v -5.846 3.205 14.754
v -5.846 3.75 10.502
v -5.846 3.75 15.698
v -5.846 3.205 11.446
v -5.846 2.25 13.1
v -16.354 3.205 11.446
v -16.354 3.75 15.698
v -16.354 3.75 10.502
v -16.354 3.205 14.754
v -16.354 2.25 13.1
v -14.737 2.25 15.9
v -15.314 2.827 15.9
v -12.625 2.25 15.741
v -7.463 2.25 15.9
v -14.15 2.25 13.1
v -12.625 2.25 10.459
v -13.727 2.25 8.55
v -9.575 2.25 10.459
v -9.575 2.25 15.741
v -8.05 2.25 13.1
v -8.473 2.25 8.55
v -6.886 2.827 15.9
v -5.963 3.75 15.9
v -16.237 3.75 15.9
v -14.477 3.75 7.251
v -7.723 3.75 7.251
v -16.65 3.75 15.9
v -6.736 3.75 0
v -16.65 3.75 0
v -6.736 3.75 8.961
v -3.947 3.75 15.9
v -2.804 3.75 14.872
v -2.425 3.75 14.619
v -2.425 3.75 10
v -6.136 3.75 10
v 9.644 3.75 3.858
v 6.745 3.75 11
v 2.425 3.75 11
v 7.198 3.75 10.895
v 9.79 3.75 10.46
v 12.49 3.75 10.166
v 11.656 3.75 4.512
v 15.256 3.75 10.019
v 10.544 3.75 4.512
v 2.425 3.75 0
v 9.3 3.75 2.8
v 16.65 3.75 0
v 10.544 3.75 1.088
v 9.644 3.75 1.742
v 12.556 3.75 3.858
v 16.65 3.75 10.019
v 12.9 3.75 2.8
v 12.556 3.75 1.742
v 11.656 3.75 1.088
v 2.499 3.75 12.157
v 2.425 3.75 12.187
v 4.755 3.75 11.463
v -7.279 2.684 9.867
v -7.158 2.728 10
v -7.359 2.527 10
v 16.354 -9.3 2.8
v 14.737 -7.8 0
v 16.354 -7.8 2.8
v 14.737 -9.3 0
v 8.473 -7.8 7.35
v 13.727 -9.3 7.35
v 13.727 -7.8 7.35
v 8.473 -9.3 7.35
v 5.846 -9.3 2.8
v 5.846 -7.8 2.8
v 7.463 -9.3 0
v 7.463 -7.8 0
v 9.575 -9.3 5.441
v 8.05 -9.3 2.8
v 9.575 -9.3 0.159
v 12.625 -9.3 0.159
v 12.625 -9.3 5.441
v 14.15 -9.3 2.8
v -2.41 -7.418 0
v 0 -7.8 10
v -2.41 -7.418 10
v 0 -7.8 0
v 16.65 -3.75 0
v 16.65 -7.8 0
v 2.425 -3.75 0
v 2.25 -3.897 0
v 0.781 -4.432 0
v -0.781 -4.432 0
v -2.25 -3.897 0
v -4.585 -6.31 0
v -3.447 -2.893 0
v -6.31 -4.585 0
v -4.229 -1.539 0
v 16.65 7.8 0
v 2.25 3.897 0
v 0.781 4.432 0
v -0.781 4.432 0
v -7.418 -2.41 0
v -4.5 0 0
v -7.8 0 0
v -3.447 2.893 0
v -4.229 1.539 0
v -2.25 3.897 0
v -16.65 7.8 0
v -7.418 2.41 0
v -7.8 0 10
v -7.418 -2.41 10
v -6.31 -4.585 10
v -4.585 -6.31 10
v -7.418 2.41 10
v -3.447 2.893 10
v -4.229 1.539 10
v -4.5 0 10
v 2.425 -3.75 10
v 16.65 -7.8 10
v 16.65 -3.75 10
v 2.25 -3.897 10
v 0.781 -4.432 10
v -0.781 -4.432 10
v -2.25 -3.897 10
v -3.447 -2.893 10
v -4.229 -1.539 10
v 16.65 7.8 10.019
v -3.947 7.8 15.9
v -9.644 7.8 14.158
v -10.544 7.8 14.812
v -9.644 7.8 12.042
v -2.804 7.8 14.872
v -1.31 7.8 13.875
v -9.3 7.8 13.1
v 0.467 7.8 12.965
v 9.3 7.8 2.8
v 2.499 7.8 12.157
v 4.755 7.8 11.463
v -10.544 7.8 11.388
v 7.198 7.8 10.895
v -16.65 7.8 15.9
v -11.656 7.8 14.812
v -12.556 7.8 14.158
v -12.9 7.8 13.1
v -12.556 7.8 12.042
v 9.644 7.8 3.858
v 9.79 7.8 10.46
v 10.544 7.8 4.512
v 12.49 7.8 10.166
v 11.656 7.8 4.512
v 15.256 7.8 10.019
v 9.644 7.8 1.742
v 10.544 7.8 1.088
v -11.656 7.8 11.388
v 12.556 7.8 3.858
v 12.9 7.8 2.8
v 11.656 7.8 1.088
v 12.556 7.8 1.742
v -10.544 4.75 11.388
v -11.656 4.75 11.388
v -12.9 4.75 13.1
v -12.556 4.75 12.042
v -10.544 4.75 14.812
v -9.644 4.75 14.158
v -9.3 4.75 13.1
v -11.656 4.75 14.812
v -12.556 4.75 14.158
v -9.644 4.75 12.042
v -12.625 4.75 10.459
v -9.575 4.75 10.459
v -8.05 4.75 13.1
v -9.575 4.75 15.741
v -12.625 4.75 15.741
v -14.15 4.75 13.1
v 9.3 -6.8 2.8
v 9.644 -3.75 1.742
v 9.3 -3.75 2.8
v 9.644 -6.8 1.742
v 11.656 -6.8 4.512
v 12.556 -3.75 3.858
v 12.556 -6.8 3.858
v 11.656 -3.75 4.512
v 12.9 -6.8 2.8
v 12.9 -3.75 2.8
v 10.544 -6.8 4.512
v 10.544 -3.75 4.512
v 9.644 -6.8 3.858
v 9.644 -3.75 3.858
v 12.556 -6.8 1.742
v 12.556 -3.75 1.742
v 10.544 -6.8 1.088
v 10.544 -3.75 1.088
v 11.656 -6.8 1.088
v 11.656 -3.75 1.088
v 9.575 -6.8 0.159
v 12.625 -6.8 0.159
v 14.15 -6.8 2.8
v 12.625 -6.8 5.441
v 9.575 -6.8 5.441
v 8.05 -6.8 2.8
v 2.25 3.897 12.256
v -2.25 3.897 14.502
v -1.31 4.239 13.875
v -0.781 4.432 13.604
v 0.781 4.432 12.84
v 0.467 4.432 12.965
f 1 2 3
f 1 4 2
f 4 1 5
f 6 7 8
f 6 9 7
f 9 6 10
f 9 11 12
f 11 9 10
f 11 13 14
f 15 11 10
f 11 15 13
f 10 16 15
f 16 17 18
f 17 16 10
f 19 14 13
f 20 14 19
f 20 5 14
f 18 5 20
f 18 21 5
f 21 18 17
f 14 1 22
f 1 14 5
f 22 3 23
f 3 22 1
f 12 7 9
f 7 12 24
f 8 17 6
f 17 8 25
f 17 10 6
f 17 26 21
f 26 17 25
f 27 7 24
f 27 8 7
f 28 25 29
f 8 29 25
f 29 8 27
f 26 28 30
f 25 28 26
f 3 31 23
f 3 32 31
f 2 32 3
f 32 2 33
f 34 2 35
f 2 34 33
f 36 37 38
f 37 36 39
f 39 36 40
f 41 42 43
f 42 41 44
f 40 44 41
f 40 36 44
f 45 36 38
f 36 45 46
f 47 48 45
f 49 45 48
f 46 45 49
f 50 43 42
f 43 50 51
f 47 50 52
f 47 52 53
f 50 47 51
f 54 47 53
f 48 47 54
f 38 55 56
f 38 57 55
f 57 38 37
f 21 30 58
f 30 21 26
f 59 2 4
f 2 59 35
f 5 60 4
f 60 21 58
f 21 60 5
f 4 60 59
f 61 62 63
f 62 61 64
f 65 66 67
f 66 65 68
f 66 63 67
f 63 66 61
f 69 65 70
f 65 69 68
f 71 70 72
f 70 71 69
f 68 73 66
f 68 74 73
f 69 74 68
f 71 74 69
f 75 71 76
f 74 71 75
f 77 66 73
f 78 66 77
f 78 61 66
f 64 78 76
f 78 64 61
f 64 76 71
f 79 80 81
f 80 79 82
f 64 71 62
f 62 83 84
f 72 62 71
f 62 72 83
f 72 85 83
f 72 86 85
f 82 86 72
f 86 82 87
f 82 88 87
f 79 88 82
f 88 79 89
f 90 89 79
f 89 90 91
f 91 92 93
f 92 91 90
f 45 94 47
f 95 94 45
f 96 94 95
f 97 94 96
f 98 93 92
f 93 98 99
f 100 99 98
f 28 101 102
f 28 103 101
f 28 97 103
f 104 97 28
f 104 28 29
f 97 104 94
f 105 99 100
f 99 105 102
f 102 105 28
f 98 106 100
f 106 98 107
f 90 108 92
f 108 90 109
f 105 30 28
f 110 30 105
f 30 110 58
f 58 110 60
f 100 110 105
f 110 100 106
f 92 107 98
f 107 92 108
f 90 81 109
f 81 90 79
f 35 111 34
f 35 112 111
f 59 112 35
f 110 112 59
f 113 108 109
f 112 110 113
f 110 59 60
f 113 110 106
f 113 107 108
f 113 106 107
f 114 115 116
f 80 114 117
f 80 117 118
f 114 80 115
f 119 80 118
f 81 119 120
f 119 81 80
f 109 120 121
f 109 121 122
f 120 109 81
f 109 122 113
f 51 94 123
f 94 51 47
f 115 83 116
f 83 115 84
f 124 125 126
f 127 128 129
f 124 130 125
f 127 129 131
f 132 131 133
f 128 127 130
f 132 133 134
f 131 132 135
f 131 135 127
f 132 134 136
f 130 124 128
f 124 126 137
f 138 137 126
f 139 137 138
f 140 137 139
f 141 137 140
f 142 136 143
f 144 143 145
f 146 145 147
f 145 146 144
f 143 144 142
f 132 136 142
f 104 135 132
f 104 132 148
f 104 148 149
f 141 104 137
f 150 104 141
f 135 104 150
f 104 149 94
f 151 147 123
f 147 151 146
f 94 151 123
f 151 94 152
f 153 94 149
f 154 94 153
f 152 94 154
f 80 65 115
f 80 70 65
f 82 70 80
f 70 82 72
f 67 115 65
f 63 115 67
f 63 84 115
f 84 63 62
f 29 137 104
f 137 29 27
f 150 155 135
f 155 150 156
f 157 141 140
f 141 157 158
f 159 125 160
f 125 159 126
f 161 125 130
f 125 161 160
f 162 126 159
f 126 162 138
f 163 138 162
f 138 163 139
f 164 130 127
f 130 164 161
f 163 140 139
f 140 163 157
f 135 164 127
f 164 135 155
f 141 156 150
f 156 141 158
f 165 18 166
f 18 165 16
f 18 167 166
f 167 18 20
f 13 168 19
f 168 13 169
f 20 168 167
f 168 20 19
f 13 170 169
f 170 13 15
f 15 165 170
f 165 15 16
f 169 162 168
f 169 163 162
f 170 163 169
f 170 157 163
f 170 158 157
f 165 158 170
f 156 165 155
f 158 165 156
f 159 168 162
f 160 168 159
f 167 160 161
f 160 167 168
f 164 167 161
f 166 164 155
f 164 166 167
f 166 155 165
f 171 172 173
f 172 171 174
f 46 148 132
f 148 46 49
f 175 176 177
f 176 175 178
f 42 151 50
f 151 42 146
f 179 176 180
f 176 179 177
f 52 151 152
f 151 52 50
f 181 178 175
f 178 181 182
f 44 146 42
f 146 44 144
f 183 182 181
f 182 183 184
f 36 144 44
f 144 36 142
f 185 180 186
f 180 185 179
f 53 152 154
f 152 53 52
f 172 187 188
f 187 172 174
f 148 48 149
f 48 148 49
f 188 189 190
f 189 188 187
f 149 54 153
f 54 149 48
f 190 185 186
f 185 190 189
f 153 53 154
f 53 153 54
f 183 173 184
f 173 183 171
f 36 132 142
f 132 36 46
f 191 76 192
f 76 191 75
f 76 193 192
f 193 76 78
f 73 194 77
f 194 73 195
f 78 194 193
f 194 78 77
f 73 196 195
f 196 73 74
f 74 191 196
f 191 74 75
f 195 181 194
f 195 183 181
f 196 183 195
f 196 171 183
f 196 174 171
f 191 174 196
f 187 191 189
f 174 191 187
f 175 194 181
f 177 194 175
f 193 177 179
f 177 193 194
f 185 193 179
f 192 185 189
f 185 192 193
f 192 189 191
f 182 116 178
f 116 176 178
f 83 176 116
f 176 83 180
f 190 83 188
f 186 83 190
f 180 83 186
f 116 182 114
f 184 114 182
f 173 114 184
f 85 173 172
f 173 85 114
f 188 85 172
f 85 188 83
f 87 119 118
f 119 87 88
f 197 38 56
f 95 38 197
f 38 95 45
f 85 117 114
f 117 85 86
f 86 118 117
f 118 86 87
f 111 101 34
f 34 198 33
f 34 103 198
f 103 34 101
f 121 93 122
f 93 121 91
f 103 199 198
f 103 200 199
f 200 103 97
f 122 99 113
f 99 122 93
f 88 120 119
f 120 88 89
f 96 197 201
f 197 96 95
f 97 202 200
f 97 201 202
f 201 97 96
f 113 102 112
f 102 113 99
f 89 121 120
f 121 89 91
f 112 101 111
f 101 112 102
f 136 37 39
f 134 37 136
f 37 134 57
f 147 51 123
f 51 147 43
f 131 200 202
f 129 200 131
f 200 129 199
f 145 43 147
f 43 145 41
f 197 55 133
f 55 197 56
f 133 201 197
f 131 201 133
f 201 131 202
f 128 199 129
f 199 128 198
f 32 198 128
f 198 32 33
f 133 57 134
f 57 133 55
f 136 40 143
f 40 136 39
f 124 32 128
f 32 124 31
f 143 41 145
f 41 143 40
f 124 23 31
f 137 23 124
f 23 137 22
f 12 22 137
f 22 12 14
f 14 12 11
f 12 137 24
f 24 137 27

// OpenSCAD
// file: functions.scad
// PRUSA Mendel  
// Functions used in many files
// GNU GPL v2
// Josef Průša
// josefprusa@me.com
// prusadjs.cz
// http://www.reprap.org/wiki/Prusa_Mendel
// http://github.com/prusajr/PrusaMendel

module nut(d,h,horizontal=true){
cornerdiameter =  (d / 2) / cos (180 / 6);
cylinder(h = h, r = cornerdiameter, $fn = 6);
if(horizontal){
for(i = [1:6]){
	rotate([0,0,60*i]) translate([-cornerdiameter-0.2,0,0]) rotate([0,0,-45]) cube(size = [2,2,h]);
}}
}

// By nophead
module polyhole(d,h) {
    n = max(round(2 * d),3);
    rotate([0,0,180])
        cylinder(h = h, r = (d / 2) / cos (180 / n), $fn = n);
}




module roundcorner(diameter){
	difference(){
		cube(size = [diameter,diameter,99], center = false);
		translate(v = [diameter, diameter, 0]) cylinder(h = 100, r=diameter, center=true);
	}
}
// file: metric.scad
// PRUSA Mendel  
// Default metric sizes
// GNU GPL v2
// Josef Průša
// josefprusa@me.com
// prusadjs.cz
// http://www.reprap.org/wiki/Prusa_Mendel
// http://github.com/prusajr/PrusaMendel

// DONT CHANGE THIS FILE! ALTER VALUES IN CONFIGURATION.SCAD INSTEAD

// RODS

threaded_rod_diameter = 8.2;
threaded_rod_diameter_horizontal = 8.2;
smooth_bar_diameter = 8;
smooth_bar_diameter_horizontal = 8.5;

// Nuts and bolts

m8_diameter = 9;
m8_nut_diameter = 16.4;

m4_diameter = 4.5;
m4_nut_diameter = 9;

m3_diameter = 3.6;
m3_nut_diameter = 6.1;
m3_nut_diameter_horizontal = 6.1;

// Bushing holder

bushing_core_diameter = smooth_bar_diameter;
bushing_material_thickness = 1;

// Motors

motor_shaft = 5.5;
// file: configuration.scad
// PRUSA Mendel  
// Configuration file
// GNU GPL v2
// Josef Průša
// josefprusa@me.com
// prusadjs.cz
// http://www.reprap.org/wiki/Prusa_Mendel
// http://github.com/prusajr/PrusaMendel

// PLEASE SELECT ONE OF THE CONFIGURATIONS BELOW
// BY UN-COMMENTING IT

// Uncomment for metric settings
// METRIC METRIC METRIC METRIC METRIC METRIC METRIC METRIC 

include <metric.scad>;

// Uncomment for imperial settings
// IMPERIAL IMPERIAL IMPERIAL IMPERIAL IMPERIAL IMPERIAL IMPERIAL 

//include <sae.scad>;

// CUSTOM CUSTOM CUSTOM CUSTOM CUSTOM CUSTOM CUSTOM CUSTOM CUSTOM

thin_wall = 3;

// LM8UU
linear = false;


// CHANGE ONLY THE STUFF YOU KNOW
// IT WILL REPLACE DEFAULT SETTING

// RODS

// threaded_rod_diameter = 0;
// threaded_rod_diameter_horizontal = 0;
// smooth_bar_díameter = 0;
// smooth_bar_díameter_horizontal = 0;

// Nuts and bolts

// m8_diameter = 0;
// m8_nut_diameter = 0;

// m4_diameter = 0;
// m4_nut_diameter = 0;

// m3_diameter = 0;
// m3_nut_diameter = 0;

// Bushing holder

// bushing_core_diameter = smooth_bar_díameter;
// bushing_material_thickness = 0;


///counted stuff
m3_nut_diameter_bigger = ((m3_nut_diameter  / 2) / cos (180 / 6))*2;

// functions 
include <functions.scad>
// main file
// PRUSA Mendel  
// Endstop holder
// Used to attach endstops to 8mm rods
// GNU GPL v2
// Josef Průša
// josefprusa@me.com
// prusadjs.cz
// http://www.reprap.org/wiki/Prusa_Mendel
// http://github.com/prusajr/PrusaMendel

include <configuration.scad>

/**
 * @name Endstop holder
 * @category Printed
 * @using 1 m3x20
 * @using 1 m3nut
 * @using 2 m3washer
 */
module endstop()
{
	outer_radius=m8_diameter/2+3.3;
	opening_size=m8_diameter-1.5;
	endstop_thickness=outer_radius-opening_size/2;
	screw_support_x=2.5;
	screw_support_z=1.5;
	hole_x_spacing=22.2;
	hole_y_spacing=10.3;
	endstop_clamp_height=10;
	endstop_height=15.9;

	full_height=hole_y_spacing+m3_nut_diameter+2*screw_support_z;
	screw_surround=m3_nut_diameter+screw_support_x*2;
	full_length=hole_x_spacing+m3_nut_diameter+screw_support_x*2;
	
	intersection()
	{
	difference()
	{
		union()
		{
			cylinder(h=10,r=outer_radius,$fn=20);

			translate([0,-outer_radius, 0]) 
			cube([hole_x_spacing/2+m3_nut_diameter/2+screw_support_x,
				outer_radius*2,endstop_clamp_height]);

			translate([-hole_x_spacing/2-m3_nut_diameter/2-screw_support_x,
				outer_radius-endstop_thickness,0])
			cube([full_length,endstop_thickness,full_height]);


			for(i=[-1,1])
			translate([0,0,endstop_height/2])
			rotate([90, 0, 0]) 
			translate([i*hole_x_spacing/2,-1*i*hole_y_spacing/2,0])
			{
				if(i==1)
				translate([0,0,outer_radius-screw_support_z])
				cylinder(h=screw_support_z*2,
					r=(m3_nut_diameter/2+screw_support_z)/cos(30),$fn = 6);

				if(i==-1)
				translate([0,0,-outer_radius+endstop_thickness])
				render()
				intersection()
				{
				translate([0,-screw_support_z,0])
				cube([(m3_nut_diameter/2+screw_support_z)/cos(30)*2,
					m3_nut_diameter+screw_support_z*2+2*screw_support_z,								screw_support_z*2+2],center=true);

				cylinder(h=screw_support_z,
					r2=(m3_nut_diameter/2+screw_support_z)/cos(30),
					r1=(m3_nut_diameter/2+screw_support_z)/cos(30)+screw_support_z,$fn = 6);
				}
			}

		}
	
		translate([0,-opening_size/2,-1]) 
		cube([18,opening_size,endstop_clamp_height+2]);

		translate([0,0,-1]) 
		cylinder(h=hole_y_spacing+m3_nut_diameter+2*screw_support_z+2,r=m8_diameter/2,$fn=18);

		for(i=[-1,1])
		translate([0,0,endstop_height/2])
		rotate([90, 0, 0]) 
		translate([i*hole_x_spacing/2,-1*i*hole_y_spacing/2,0])
		{
			cylinder(h=outer_radius*2+2,r=m3_diameter/2,$fn=10,center=true);
			translate((i==-1)?
				[0,0,-outer_radius+endstop_thickness-1]:
				[0,0,outer_radius-1])
			cylinder(h=4,r= m3_nut_diameter/2,$fn=6);
		}

		translate([full_length/2,0,full_height])
		scale([(full_length-screw_surround)/(full_height-endstop_clamp_height),1,1])
		rotate([90,0,0])
		cylinder(r=full_height-endstop_clamp_height,h=outer_radius*2+2,center=true,$fn=50);
	}
	translate([-full_length/2,-outer_radius-5])
	cube([full_length,outer_radius*2+10,endstop_height]);
	}
}
endstop();
